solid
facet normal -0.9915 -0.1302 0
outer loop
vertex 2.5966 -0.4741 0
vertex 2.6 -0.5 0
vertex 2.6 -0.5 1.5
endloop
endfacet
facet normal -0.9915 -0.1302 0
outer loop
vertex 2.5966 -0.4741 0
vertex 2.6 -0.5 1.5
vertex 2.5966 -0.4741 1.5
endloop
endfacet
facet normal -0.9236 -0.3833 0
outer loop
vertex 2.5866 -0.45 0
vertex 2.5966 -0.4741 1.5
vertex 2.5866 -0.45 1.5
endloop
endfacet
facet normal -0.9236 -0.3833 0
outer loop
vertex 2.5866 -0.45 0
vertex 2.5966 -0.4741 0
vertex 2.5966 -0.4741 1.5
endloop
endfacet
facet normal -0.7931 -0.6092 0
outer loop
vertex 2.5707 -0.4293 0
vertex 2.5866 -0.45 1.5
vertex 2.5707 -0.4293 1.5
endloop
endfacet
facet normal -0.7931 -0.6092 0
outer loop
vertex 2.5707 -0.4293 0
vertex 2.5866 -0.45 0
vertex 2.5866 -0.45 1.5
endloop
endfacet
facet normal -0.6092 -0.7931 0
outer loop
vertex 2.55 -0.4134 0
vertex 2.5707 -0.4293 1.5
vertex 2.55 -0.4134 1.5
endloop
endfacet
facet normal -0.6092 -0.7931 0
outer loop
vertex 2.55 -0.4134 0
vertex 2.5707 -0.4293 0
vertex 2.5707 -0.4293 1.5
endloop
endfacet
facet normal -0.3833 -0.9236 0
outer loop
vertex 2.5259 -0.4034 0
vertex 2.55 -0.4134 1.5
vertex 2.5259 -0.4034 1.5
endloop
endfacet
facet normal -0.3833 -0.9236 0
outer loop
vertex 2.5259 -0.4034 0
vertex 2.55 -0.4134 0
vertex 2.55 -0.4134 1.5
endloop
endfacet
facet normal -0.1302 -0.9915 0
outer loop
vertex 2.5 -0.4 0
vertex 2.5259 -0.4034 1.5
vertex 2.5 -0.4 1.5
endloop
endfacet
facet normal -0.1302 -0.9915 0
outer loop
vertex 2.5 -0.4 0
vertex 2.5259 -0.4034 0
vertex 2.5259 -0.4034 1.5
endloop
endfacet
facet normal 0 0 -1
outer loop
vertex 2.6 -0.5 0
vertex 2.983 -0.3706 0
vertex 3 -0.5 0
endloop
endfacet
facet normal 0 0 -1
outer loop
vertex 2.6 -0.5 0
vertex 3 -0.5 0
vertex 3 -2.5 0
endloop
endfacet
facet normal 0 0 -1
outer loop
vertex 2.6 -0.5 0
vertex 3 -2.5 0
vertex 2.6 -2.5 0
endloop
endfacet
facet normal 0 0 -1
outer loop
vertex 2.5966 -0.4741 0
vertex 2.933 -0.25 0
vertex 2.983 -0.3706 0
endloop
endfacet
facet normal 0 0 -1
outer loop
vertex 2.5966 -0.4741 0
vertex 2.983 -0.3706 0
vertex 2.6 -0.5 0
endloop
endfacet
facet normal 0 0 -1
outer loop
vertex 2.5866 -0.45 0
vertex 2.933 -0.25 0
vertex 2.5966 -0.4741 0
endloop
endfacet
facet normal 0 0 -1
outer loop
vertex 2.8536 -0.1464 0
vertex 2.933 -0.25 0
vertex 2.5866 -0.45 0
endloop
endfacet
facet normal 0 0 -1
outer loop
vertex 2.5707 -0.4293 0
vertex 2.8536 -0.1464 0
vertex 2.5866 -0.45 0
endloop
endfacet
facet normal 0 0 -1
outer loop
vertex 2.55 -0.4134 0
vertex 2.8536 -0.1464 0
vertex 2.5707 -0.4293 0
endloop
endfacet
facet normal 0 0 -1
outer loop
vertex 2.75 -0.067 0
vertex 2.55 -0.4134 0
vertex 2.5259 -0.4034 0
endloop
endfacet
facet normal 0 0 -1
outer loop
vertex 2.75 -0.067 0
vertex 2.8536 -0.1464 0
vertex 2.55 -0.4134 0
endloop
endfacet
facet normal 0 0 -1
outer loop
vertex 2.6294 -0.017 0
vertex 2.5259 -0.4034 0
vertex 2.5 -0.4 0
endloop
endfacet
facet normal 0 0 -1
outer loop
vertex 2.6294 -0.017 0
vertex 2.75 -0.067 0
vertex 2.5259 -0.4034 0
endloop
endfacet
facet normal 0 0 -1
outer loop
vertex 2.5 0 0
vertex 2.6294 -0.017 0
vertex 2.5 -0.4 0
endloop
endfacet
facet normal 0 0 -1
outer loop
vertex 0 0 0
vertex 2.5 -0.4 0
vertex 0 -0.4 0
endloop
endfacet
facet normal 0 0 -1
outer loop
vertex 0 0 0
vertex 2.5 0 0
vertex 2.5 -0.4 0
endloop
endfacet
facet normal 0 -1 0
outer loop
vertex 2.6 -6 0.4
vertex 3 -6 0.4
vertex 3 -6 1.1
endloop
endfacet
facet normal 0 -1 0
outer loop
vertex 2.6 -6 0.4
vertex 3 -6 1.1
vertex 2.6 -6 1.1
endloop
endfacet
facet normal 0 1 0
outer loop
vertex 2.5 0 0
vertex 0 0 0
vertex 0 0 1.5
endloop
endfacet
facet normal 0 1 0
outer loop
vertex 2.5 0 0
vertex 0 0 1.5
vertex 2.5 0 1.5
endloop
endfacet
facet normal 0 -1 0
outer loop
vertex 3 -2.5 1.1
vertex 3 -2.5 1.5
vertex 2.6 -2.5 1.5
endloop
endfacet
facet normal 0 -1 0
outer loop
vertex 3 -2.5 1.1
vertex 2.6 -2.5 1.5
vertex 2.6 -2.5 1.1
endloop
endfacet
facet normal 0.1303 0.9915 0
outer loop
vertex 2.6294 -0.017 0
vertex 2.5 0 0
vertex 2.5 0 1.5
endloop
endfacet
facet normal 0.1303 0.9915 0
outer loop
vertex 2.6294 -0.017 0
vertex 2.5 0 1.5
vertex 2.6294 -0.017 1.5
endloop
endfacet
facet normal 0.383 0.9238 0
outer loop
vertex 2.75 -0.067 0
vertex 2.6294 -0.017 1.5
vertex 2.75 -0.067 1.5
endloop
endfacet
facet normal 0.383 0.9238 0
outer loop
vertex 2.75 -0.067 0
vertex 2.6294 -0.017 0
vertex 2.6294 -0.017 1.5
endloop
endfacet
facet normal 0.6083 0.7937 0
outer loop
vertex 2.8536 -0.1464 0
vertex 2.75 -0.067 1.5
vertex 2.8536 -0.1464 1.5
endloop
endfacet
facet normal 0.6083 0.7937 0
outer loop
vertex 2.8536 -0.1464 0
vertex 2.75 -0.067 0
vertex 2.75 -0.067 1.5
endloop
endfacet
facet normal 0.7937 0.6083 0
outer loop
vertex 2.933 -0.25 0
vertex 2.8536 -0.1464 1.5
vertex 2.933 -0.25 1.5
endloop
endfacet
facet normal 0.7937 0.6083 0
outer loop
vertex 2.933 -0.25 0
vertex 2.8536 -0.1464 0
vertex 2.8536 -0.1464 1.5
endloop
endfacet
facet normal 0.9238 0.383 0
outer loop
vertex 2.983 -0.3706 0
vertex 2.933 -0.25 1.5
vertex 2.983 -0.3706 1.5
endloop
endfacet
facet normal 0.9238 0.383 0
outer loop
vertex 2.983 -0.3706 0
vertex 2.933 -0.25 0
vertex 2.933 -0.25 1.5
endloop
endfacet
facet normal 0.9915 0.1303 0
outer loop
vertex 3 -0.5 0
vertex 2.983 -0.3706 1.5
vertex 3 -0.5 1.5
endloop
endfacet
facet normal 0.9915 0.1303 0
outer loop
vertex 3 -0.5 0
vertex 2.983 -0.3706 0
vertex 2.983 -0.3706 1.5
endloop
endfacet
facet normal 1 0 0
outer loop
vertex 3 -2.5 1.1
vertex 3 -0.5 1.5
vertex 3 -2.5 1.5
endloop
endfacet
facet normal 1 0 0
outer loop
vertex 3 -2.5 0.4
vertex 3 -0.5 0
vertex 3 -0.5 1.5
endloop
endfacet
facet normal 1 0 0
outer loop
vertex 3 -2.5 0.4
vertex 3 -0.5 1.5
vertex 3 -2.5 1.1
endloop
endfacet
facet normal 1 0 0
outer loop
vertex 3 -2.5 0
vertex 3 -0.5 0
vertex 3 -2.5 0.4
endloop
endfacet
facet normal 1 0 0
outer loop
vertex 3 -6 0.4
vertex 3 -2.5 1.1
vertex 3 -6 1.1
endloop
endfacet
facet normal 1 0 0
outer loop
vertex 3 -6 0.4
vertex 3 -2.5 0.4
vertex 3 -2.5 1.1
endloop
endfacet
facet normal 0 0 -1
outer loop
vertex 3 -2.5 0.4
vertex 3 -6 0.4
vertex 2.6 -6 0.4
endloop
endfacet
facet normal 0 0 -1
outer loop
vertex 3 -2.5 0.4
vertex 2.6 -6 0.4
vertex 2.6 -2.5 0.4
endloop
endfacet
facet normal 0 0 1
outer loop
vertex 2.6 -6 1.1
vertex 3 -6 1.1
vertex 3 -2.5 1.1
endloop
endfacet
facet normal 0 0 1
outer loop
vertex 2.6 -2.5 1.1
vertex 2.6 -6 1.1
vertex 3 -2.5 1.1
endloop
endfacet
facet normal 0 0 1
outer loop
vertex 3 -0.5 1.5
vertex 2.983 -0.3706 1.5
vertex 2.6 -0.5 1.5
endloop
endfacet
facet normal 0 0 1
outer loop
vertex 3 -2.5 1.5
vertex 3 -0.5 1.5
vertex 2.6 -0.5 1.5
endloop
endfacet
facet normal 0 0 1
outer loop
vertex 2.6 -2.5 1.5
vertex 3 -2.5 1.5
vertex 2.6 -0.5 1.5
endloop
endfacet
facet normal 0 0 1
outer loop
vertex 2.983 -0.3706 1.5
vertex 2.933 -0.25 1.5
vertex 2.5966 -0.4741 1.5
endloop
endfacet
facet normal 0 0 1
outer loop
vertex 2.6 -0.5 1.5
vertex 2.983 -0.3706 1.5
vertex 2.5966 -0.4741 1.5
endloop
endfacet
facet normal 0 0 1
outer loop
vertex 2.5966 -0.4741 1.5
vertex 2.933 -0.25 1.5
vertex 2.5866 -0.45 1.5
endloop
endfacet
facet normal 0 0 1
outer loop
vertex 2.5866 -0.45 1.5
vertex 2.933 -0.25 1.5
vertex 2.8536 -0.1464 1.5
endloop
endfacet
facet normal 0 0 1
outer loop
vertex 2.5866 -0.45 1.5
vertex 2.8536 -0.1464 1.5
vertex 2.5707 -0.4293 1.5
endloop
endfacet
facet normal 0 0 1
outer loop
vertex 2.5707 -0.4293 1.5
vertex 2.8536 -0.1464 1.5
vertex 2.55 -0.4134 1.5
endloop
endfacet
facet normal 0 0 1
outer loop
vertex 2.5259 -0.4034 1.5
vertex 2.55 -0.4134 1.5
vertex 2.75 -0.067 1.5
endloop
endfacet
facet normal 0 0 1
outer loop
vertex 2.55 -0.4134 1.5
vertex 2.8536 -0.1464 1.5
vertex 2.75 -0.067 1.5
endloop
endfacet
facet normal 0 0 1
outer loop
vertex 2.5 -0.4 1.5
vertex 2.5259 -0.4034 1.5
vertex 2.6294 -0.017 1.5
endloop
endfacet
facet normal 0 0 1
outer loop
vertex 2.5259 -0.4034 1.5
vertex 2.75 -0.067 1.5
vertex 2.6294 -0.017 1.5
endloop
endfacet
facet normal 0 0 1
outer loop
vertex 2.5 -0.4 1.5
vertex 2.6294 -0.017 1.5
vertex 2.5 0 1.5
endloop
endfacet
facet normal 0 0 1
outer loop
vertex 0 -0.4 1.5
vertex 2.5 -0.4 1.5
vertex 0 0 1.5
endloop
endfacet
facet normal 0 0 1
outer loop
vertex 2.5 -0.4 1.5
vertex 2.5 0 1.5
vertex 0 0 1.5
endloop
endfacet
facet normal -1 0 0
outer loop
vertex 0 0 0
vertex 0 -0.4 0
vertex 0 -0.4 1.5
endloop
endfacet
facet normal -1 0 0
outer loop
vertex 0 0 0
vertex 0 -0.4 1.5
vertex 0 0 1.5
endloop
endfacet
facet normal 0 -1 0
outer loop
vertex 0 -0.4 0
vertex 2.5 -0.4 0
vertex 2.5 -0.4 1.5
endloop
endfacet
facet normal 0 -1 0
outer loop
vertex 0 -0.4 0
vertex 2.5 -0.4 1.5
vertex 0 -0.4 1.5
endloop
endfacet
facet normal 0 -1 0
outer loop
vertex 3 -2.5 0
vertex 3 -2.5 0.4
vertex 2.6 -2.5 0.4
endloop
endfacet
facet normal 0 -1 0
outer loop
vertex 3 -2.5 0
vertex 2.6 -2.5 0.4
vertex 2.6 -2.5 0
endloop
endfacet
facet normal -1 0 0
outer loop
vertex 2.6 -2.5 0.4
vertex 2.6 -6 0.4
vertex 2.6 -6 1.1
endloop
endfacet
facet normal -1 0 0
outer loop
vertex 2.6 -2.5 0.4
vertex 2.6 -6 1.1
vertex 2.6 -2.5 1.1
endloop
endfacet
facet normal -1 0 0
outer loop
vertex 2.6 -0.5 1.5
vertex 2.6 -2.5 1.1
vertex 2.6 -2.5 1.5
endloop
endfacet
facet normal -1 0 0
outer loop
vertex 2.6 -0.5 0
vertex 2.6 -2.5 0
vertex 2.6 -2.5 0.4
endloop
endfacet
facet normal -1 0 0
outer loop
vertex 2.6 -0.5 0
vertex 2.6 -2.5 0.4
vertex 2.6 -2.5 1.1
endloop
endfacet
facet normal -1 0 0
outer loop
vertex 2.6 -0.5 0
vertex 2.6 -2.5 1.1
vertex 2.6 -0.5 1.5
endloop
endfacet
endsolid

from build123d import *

# Parameters (mm, degrees)
BOSS_EXTRUDE1_DEPTH = 1.5
CUT_EXTRUDE1_REACH  = 5
SKETCH2_W           = 0.4
SKETCH2_H           = 3.5


with BuildPart() as part:
    # Sketch1 → Boss-Extrude1 (new body)
    with BuildSketch(Plane.XY):
        with BuildLine():
            Line((0, 0), (2.5, 0))
            ThreePointArc((2.5, 0), (2.853553391, -0.146446609), (3, -0.5))
            Line((3, -0.5), (3, -6))
            Line((3, -6), (2.6, -6))
            Line((2.6, -6), (2.6, -0.5))
            ThreePointArc((2.6, -0.5), (2.570710678, -0.429289322), (2.5, -0.4))
            Line((2.5, -0.4), (0, -0.4))
            Line((0, -0.4), (0, 0))
        make_face()
    extrude(amount=BOSS_EXTRUDE1_DEPTH)

    # Sketch2 → Cut-Extrude1 (cut, up to next)
    with BuildSketch(Plane(origin=(3, 0, 0), x_dir=(0, 0, -1), z_dir=(1, 0, 0)), mode=Mode.PRIVATE) as cut_extrude1_sk1:
        with Locations((-0.2, -4.25)):
            Rectangle(SKETCH2_W, SKETCH2_H)
    cut_extrude1_tool1 = extrude(cut_extrude1_sk1.sketch, amount=-CUT_EXTRUDE1_REACH, mode=Mode.PRIVATE) & part.part
    add(cut_extrude1_tool1.solids().sort_by_distance((3, -4.25, 0.2))[0], mode=Mode.SUBTRACT)
    # Sketch2 → Cut-Extrude1 (cut, up to next)
    with BuildSketch(Plane(origin=(3, 0, 0), x_dir=(0, 0, -1), z_dir=(1, 0, 0)), mode=Mode.PRIVATE) as cut_extrude1_sk2:
        with Locations((-1.3, -4.25)):
            Rectangle(SKETCH2_W, SKETCH2_H)
    cut_extrude1_tool2 = extrude(cut_extrude1_sk2.sketch, amount=-CUT_EXTRUDE1_REACH, mode=Mode.PRIVATE) & part.part
    add(cut_extrude1_tool2.solids().sort_by_distance((3, -4.25, 1.3))[0], mode=Mode.SUBTRACT)


solid = part.part
